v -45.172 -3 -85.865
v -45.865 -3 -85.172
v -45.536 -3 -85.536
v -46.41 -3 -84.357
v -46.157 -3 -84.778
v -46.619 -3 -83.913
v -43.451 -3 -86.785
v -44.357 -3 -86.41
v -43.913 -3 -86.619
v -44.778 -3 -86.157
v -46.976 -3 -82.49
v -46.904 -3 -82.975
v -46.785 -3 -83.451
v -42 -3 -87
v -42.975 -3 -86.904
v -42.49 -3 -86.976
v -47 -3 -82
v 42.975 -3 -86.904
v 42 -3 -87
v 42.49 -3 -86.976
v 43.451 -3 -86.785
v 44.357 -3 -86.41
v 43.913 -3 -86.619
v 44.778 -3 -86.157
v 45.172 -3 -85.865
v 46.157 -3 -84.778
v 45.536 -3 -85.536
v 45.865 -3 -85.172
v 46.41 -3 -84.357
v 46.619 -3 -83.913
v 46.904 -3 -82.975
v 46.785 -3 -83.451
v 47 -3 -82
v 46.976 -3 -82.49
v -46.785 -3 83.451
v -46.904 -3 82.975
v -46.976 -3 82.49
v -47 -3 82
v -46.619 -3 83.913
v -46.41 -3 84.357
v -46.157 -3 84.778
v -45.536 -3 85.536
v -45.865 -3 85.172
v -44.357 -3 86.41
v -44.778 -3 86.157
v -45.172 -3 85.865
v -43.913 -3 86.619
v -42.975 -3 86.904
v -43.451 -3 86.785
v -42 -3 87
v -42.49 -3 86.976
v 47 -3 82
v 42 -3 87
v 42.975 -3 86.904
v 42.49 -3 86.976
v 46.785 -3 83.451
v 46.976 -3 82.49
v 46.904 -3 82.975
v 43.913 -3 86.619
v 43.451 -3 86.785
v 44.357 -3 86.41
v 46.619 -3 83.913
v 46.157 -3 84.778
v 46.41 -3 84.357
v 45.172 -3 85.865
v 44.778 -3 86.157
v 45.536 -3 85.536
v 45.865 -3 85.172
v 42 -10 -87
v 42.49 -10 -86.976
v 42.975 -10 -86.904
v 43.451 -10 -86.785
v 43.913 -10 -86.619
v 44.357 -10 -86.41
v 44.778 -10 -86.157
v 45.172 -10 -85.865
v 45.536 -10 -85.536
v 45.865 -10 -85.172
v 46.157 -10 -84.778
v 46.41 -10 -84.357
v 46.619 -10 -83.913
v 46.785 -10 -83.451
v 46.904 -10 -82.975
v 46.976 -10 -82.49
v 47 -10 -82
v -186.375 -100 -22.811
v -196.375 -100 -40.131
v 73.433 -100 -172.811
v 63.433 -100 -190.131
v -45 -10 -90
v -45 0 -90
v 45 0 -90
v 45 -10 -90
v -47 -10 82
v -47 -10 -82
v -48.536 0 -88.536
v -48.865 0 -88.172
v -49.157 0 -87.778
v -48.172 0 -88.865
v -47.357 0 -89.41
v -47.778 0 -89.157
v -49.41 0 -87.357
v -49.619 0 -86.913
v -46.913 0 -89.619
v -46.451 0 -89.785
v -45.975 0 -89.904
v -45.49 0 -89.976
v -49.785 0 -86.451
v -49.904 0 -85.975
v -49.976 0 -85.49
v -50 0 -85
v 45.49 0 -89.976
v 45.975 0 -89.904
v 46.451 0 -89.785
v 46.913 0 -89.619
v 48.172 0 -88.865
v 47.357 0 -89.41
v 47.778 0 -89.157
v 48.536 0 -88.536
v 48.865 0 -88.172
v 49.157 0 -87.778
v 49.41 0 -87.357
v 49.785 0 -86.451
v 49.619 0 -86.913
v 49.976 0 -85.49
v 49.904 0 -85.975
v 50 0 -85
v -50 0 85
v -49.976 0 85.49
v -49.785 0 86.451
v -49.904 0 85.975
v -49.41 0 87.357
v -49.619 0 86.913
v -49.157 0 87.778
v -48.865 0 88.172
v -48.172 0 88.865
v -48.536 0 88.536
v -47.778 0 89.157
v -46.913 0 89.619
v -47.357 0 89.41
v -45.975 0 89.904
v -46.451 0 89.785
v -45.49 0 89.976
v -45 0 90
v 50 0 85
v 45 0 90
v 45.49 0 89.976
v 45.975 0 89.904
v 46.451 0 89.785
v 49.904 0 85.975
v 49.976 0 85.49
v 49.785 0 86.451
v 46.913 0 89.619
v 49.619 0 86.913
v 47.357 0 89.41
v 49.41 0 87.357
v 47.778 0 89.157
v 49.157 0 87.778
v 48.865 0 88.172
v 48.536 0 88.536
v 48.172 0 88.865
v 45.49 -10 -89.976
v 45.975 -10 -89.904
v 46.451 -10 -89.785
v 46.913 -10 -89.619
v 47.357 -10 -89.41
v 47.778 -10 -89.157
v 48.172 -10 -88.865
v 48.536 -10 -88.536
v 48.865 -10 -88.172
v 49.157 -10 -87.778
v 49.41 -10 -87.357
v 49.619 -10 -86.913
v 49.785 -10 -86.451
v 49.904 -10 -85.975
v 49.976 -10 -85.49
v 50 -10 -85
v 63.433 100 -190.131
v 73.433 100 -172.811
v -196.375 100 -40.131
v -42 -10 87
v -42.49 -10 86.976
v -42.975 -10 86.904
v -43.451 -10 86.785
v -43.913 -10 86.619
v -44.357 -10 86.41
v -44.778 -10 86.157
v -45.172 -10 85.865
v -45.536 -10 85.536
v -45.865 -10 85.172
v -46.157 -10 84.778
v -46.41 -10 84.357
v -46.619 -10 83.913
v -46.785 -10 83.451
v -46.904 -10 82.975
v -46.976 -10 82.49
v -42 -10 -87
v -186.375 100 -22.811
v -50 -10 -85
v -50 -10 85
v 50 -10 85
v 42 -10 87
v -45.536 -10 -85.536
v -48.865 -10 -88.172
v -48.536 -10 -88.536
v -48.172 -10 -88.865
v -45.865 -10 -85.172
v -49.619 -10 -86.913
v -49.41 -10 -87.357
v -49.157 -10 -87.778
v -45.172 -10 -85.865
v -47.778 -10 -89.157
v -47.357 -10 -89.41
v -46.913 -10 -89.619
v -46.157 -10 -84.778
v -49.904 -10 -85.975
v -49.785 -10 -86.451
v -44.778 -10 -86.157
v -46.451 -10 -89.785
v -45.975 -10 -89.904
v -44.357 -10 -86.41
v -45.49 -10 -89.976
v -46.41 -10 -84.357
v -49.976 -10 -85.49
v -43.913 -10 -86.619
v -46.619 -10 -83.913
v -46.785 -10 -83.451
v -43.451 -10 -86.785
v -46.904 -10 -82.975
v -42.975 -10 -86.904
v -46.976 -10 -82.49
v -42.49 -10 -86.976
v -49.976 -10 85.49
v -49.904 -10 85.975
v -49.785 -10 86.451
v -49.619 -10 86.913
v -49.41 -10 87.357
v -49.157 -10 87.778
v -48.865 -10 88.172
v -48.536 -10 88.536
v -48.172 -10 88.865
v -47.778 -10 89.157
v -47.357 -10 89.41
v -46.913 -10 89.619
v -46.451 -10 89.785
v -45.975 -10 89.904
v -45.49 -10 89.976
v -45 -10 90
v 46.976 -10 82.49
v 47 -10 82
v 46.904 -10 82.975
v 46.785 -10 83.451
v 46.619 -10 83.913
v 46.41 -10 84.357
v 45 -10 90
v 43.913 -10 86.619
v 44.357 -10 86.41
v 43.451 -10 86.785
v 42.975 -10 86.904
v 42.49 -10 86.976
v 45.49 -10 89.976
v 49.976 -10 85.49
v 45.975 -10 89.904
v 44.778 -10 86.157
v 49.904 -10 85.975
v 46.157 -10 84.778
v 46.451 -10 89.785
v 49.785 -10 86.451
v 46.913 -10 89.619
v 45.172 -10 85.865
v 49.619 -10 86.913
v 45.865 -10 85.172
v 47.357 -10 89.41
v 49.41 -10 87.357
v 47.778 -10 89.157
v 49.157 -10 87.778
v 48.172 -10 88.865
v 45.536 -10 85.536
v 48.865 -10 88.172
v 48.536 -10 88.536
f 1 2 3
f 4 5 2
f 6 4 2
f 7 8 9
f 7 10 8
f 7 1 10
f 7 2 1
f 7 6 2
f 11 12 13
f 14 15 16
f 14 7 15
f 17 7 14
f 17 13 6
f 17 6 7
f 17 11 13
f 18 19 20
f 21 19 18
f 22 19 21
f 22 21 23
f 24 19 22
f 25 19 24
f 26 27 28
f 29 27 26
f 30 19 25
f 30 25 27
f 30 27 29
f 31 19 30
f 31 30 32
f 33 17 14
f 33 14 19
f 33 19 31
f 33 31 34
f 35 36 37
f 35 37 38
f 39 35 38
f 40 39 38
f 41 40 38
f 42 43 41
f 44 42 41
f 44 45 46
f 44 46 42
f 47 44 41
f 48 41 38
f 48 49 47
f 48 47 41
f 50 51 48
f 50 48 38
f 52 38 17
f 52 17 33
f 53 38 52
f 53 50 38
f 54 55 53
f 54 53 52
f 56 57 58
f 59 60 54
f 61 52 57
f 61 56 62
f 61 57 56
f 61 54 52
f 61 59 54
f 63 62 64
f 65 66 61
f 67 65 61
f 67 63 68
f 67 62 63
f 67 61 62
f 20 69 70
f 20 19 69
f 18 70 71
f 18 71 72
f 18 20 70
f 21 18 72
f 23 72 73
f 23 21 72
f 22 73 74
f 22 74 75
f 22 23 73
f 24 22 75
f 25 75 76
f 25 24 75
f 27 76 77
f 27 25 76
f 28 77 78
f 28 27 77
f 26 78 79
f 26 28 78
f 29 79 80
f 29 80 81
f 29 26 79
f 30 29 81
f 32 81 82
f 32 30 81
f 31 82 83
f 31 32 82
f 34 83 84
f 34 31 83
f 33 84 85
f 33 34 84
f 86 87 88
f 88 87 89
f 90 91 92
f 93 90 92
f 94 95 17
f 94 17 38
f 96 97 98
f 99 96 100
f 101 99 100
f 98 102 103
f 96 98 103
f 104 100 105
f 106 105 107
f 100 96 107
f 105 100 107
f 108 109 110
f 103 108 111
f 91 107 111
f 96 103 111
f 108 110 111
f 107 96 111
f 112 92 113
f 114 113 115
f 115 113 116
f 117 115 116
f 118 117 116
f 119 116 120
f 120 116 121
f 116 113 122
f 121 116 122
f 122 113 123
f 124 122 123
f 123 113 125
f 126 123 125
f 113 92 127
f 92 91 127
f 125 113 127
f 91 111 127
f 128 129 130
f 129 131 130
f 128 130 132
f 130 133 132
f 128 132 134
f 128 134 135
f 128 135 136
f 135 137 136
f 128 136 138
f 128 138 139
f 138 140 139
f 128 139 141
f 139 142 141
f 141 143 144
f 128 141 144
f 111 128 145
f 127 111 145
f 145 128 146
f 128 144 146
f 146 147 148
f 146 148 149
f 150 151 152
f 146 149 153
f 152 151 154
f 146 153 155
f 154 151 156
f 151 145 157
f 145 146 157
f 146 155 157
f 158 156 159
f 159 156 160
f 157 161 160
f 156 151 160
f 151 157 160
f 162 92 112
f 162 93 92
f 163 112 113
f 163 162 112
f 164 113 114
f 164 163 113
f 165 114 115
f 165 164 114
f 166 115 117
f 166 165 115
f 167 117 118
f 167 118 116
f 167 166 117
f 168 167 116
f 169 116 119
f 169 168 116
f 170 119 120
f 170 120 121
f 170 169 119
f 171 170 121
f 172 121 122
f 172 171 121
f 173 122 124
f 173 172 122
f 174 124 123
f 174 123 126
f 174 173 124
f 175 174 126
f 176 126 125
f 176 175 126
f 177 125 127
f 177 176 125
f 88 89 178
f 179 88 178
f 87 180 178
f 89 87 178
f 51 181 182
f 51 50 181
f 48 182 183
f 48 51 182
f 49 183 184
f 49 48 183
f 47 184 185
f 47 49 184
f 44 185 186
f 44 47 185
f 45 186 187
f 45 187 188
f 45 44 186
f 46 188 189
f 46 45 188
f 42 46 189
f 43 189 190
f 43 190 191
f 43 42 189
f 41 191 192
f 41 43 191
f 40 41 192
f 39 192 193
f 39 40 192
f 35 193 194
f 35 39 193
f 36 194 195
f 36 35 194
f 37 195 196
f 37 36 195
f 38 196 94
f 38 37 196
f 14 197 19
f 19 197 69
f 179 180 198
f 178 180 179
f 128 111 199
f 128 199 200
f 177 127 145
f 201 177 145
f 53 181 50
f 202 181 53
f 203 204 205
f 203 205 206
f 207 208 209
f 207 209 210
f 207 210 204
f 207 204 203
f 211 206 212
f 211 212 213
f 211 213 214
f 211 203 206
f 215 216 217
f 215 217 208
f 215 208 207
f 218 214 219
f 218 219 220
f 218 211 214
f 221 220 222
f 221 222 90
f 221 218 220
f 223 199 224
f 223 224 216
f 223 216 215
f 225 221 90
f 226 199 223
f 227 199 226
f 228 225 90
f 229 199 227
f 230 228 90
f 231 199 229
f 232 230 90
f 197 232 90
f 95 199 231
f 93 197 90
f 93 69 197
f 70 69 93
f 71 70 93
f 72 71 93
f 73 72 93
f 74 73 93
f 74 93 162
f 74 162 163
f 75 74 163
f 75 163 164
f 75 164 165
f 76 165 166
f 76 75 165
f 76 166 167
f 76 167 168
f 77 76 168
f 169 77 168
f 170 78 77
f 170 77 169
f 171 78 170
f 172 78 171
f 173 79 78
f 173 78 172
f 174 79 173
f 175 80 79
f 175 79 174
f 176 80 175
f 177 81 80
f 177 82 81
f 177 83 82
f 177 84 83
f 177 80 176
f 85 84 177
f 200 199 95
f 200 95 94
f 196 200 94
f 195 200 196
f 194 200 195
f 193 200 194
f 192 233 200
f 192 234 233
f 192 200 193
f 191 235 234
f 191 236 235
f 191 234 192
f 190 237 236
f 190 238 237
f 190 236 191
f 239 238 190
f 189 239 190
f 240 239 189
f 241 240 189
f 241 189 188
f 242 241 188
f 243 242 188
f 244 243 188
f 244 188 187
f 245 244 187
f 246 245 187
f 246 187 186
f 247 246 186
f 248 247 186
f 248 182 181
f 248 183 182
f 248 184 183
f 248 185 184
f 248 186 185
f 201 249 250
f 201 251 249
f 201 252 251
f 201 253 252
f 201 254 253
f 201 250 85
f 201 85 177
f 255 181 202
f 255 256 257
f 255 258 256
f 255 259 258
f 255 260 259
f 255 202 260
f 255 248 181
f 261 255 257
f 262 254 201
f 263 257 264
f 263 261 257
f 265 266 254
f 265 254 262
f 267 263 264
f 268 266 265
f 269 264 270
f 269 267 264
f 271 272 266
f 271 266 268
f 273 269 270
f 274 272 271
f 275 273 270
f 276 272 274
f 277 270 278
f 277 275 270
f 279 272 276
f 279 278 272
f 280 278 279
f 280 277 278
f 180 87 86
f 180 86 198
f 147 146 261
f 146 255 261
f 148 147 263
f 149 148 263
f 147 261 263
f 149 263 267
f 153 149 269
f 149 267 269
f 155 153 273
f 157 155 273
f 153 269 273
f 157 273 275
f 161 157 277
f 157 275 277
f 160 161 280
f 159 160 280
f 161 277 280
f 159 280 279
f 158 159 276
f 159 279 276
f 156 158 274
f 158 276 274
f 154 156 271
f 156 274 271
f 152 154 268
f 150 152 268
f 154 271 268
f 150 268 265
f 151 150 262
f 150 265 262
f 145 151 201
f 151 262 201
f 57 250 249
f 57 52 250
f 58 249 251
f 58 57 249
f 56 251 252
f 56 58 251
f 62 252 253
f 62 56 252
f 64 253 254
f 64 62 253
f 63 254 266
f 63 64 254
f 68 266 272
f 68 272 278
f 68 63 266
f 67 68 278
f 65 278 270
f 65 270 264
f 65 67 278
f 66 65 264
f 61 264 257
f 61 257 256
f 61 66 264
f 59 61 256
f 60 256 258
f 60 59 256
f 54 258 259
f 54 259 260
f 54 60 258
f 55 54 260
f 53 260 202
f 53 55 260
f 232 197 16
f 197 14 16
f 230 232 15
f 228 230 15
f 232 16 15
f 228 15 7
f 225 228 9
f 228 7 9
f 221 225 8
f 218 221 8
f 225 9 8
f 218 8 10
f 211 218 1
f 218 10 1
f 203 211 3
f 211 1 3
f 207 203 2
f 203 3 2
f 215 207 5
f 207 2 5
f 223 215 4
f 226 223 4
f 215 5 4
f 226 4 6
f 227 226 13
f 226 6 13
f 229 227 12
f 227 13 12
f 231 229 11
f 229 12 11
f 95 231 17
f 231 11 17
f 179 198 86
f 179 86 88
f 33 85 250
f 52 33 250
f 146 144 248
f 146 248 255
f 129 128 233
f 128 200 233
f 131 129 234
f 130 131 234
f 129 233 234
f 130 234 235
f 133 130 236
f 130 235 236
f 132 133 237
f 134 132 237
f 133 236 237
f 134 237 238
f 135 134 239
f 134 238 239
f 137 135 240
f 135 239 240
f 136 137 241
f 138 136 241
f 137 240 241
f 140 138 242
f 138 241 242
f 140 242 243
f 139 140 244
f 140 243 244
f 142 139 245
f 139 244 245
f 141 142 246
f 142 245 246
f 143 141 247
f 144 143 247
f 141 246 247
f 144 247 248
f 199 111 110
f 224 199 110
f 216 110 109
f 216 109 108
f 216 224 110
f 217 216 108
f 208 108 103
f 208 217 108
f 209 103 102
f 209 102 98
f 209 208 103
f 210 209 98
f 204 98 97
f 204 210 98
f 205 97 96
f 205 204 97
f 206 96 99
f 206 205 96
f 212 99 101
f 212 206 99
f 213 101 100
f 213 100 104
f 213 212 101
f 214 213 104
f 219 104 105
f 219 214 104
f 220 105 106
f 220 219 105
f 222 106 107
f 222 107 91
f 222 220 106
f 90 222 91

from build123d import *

# Parameters (mm, degrees)
F0_W     = 100
F0_H     = 180
F1_DEPTH = 10
F2_W     = 94
F2_H     = 174
F3_DEPTH = 7
F6_W     = 300
F6_H     = 200
F7_DEPTH = 20
F8_R     = 5


with BuildPart() as f1:
    # F0 (on Front) → F1 (new body)
    with BuildSketch(Plane.XZ):
        Rectangle(F0_W, F0_H)
    extrude(amount=F1_DEPTH)

    # F2 (on face) → F3 (cut)
    with BuildSketch(Plane.XZ.offset(10)):
        Rectangle(F2_W, F2_H)
    extrude(amount=-F3_DEPTH, mode=Mode.SUBTRACT)

    # F8
    f8_edges = [f1.edges().sort_by_distance(p)[0] for p in [
        (-47, -6.5, -87),
        (50, -5, 90),
        (-50, -5, 90),
        (-47, -6.5, 87),
        (47, -6.5, -87),
        (-50, -5, -90),
        (47, -6.5, 87),
        (50, -5, -90),
    ]]
    fillet(f8_edges, radius=F8_R)


with BuildPart() as f7:
    # F6 (on face) → F7 (new body)
    with BuildSketch(Plane(origin=(-66.4711431703, 0, -115.1313972081), x_dir=(0.8660254038, 0, -0.5), z_dir=(0.5, 0, 0.8660254038))):
        Rectangle(F6_W, F6_H)
    extrude(amount=F7_DEPTH)


solid = Compound([f1.part, f7.part])
